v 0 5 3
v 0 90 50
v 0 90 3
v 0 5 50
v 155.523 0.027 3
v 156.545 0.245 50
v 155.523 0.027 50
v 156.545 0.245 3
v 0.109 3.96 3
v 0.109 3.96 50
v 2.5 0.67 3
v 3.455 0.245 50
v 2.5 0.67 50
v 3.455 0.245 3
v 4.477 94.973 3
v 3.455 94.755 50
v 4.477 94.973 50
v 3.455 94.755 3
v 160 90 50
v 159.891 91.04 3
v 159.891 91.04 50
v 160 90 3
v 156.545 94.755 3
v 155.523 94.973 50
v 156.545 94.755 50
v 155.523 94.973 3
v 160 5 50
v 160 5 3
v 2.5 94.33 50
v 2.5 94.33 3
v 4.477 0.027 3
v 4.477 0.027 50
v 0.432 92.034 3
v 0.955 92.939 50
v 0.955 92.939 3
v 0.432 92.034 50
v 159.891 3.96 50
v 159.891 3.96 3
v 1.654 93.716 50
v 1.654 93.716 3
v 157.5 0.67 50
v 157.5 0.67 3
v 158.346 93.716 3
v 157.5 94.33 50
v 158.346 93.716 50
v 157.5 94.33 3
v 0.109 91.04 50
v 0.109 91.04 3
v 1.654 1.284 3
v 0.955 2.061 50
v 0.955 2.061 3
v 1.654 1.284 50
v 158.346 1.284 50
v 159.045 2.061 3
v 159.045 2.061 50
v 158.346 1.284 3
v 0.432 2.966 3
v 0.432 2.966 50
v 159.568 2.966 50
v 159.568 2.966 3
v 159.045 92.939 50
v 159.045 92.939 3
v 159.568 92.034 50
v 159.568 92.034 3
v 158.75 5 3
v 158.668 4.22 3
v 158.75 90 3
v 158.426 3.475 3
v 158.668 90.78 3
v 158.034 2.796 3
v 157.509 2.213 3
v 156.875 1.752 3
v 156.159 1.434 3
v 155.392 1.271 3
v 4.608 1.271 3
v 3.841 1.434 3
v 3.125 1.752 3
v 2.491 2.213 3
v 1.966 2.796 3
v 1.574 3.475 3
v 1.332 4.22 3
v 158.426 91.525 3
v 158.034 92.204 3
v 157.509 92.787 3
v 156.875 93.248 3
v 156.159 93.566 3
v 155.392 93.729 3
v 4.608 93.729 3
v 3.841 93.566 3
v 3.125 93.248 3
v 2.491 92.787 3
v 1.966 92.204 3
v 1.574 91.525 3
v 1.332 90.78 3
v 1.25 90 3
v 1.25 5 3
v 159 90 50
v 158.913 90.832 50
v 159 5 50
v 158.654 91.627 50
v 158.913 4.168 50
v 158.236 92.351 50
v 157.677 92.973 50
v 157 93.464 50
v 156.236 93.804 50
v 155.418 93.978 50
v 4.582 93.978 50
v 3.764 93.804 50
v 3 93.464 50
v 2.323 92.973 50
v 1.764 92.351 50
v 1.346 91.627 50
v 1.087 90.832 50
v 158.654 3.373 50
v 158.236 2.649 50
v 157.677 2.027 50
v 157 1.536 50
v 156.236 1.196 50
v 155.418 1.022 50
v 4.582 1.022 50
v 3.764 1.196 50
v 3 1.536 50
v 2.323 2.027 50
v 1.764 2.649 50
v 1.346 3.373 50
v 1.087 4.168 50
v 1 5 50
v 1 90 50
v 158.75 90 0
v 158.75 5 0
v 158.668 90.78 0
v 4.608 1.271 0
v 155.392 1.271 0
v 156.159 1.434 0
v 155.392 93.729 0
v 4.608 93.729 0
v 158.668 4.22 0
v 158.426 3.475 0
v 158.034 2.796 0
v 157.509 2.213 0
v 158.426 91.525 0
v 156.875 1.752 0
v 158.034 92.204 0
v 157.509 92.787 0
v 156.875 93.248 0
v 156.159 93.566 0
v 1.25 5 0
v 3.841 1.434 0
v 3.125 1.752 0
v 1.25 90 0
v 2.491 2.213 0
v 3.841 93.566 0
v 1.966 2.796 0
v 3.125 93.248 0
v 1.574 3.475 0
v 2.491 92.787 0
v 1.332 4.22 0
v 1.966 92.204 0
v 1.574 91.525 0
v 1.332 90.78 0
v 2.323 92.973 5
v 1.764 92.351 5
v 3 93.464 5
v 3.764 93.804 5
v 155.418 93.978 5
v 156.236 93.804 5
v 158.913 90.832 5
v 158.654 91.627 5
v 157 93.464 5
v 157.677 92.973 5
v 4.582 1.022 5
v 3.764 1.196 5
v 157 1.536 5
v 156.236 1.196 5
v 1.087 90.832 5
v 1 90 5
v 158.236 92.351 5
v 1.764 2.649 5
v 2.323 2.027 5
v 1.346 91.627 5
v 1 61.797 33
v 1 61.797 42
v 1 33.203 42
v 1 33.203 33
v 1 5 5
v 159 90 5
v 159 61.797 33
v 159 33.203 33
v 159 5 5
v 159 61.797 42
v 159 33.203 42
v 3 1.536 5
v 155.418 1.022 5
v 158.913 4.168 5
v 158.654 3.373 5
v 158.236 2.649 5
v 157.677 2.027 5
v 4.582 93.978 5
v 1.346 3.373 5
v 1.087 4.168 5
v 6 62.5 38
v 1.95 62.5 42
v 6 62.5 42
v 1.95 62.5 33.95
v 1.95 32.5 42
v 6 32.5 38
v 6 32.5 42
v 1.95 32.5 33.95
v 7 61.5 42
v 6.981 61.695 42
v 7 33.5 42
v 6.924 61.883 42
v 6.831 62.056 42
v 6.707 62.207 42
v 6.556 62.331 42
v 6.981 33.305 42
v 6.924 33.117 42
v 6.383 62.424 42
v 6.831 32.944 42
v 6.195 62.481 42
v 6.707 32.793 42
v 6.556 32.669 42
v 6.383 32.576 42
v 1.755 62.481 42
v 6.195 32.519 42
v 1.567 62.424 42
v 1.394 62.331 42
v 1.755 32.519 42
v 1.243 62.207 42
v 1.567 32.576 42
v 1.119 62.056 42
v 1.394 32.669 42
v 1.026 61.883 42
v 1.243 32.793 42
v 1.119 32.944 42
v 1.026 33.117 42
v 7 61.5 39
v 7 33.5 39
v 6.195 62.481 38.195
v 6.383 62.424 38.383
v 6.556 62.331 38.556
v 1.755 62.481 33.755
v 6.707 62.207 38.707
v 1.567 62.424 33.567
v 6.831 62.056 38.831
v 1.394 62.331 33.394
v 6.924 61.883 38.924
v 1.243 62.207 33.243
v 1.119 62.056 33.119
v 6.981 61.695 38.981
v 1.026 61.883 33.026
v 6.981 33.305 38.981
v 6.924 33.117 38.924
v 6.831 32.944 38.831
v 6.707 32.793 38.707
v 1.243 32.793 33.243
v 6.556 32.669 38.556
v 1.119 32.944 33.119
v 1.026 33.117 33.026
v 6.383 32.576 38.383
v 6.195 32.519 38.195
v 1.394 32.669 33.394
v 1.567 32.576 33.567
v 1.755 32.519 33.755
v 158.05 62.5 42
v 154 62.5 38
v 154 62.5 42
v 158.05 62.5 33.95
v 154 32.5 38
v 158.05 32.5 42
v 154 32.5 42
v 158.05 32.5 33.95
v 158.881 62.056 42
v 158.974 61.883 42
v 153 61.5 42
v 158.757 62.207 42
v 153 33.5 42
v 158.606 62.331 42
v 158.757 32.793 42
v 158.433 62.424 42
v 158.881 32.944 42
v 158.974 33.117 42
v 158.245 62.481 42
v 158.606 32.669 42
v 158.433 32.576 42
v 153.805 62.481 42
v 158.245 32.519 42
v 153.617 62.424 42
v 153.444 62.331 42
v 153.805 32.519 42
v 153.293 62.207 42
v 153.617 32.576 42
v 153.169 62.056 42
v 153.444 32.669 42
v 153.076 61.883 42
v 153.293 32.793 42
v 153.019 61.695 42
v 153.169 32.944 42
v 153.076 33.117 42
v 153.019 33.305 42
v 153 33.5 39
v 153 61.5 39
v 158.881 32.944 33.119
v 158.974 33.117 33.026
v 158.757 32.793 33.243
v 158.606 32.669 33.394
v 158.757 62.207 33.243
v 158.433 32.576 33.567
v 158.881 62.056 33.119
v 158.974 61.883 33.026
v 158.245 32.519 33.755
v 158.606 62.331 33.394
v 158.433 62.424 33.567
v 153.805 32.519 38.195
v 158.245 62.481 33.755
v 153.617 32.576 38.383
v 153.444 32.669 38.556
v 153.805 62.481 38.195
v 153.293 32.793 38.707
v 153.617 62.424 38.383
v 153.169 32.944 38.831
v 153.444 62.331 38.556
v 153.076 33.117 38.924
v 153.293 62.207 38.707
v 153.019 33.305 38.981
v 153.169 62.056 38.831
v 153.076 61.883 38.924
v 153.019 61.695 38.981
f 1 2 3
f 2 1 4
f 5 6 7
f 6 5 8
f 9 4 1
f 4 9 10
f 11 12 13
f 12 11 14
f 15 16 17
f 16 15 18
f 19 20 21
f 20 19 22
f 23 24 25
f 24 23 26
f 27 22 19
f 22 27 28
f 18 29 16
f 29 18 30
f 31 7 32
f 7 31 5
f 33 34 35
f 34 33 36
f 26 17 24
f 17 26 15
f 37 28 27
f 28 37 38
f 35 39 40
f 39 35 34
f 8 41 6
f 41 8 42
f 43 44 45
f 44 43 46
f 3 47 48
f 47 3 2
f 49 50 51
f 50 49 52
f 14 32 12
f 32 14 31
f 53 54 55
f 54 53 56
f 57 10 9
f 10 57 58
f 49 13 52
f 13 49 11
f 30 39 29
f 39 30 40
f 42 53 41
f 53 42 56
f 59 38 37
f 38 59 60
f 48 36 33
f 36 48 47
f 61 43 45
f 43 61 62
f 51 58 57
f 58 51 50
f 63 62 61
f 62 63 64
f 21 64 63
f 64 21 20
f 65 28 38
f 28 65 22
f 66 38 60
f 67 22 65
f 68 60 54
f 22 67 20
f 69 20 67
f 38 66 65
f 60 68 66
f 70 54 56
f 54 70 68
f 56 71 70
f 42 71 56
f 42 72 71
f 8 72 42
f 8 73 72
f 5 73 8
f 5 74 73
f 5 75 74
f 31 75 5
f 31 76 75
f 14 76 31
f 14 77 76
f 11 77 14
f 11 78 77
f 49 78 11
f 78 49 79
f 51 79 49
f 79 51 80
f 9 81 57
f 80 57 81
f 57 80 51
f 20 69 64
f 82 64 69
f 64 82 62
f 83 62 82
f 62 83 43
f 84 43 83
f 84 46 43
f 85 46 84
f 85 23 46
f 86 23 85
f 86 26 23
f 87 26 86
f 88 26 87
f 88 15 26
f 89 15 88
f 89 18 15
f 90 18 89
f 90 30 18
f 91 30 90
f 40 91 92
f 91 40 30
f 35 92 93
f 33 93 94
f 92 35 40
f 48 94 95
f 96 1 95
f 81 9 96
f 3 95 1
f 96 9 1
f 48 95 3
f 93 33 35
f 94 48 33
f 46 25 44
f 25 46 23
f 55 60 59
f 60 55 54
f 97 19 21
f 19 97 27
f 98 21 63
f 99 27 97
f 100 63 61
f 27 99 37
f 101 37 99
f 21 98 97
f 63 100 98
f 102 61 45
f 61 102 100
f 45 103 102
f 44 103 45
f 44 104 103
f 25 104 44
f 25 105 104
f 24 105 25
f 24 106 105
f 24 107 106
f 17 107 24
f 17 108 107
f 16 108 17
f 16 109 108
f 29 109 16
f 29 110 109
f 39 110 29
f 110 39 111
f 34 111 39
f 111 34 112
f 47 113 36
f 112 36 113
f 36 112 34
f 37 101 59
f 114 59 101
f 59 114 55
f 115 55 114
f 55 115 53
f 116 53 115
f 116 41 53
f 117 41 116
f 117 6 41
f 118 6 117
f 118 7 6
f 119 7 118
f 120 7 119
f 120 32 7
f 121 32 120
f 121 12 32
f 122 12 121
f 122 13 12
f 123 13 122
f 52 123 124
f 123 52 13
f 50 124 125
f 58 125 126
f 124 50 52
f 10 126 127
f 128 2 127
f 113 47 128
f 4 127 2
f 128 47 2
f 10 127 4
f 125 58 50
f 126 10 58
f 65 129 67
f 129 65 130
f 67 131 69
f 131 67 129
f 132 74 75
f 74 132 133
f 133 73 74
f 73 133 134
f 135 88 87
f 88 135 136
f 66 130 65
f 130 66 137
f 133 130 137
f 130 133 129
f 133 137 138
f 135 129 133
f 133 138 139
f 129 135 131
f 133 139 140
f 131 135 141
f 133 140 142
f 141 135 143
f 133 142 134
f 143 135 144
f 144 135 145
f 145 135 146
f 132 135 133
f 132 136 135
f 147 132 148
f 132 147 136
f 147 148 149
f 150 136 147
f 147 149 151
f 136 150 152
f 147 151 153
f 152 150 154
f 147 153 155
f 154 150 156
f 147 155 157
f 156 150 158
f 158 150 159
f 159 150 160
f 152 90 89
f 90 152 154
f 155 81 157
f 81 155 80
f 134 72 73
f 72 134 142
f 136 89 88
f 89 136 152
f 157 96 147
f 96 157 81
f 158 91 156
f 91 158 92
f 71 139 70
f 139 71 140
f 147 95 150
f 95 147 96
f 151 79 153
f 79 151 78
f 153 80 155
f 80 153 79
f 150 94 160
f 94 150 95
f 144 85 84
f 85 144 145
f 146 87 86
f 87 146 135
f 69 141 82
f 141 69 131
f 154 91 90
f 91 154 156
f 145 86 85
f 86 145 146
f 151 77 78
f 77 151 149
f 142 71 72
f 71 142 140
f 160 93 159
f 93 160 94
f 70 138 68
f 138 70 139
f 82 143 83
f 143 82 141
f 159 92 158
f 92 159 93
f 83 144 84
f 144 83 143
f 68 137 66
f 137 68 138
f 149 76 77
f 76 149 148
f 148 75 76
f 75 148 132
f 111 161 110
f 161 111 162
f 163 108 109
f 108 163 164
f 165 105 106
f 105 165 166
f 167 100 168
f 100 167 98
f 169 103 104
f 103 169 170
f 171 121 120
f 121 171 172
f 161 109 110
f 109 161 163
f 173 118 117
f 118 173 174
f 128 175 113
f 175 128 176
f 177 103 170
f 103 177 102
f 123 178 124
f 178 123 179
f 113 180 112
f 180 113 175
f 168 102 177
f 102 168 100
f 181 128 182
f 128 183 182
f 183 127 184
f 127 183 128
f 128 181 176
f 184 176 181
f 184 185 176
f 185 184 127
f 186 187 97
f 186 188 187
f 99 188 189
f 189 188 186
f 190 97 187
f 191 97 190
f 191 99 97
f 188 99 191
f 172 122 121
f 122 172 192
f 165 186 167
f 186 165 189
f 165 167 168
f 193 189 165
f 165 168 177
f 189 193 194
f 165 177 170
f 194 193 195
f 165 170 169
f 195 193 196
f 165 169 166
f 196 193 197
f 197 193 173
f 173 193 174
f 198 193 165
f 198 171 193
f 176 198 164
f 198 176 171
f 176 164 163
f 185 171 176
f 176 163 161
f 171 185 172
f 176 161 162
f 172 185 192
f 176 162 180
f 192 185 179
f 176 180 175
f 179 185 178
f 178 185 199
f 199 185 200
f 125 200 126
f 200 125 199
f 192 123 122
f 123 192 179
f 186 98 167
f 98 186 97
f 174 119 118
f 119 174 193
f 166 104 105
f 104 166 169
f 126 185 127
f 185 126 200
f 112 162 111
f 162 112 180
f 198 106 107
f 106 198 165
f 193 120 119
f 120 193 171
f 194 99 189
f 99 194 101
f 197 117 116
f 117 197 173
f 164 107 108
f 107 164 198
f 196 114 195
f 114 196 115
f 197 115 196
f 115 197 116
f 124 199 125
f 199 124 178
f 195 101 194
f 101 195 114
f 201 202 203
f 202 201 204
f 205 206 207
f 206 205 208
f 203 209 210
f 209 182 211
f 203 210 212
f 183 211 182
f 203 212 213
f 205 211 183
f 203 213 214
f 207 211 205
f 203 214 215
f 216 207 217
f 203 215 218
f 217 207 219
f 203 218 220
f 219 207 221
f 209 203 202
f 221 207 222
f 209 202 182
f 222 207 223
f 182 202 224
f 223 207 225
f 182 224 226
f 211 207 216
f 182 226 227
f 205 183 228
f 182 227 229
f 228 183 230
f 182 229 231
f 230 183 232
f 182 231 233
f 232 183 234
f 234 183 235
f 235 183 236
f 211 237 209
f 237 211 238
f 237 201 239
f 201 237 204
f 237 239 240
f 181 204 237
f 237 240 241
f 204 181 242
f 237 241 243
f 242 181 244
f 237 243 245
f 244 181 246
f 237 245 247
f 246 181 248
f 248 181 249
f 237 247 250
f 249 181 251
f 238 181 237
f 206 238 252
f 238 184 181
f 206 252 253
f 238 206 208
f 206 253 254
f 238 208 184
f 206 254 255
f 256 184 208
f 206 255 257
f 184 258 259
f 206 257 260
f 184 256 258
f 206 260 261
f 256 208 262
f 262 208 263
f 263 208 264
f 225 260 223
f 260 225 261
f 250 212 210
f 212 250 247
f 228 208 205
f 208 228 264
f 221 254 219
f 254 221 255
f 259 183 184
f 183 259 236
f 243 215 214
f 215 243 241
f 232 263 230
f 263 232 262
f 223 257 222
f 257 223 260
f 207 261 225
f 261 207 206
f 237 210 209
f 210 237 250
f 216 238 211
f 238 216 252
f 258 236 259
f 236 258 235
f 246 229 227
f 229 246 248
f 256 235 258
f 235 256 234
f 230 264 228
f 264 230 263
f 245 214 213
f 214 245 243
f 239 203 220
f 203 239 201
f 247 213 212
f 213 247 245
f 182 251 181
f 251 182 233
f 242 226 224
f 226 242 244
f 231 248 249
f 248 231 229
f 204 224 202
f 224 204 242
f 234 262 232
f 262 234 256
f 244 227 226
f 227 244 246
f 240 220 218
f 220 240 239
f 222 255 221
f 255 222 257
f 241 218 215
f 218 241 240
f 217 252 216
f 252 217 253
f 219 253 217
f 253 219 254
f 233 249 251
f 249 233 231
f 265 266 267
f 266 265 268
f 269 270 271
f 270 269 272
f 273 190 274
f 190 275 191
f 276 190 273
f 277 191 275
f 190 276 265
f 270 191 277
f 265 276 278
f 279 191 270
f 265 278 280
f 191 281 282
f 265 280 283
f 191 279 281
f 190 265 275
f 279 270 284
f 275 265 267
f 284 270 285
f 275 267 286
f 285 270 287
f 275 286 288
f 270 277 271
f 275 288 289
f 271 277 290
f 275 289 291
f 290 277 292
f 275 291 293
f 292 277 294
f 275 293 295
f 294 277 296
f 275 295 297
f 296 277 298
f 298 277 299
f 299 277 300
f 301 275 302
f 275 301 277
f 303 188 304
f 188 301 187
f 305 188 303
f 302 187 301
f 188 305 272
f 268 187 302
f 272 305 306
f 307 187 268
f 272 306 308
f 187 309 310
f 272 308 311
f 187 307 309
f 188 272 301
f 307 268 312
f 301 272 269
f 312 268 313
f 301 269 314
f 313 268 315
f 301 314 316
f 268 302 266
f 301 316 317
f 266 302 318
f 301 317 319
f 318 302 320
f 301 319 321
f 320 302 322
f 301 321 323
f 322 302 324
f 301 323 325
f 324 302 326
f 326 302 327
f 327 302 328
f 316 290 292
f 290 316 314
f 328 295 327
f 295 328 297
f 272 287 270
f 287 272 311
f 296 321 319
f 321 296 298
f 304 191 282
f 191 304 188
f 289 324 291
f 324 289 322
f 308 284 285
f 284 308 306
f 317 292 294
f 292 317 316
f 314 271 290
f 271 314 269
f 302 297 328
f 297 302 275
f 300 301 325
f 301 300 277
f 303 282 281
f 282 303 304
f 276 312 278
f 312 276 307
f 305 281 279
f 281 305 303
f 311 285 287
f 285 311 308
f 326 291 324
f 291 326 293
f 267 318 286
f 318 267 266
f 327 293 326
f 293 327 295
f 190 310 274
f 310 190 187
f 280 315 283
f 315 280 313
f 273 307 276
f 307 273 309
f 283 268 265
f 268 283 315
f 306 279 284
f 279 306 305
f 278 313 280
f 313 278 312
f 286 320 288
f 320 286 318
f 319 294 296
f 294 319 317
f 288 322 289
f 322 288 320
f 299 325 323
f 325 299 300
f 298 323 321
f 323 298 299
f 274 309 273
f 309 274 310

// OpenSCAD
/* [Display] */
itemsShown="both"; // [both,box,lid]

/* [Box] */
boxLength=160;
boxWidth=95;
boxHeight=50;
cornerRadius=5;
wallThickness=1;
bottomThickness=2;

/* [Stacking] */
// Lidless boxes only. The inset base locates inside the box below.
withStacking=true;
stackingDepth=3;
// Gap per side between the inset base and the lower box's inner wall.
stackingClearance=0.25;

/* [Lid] */
withLid=false;
lidThickness=2;
lidClearance=0.2;
lidEdgeThickness=0.5;
withNotch=true;

/* [Internal pull ledges] */
// Short end walls: start is X=0, end is X=boxLength. Remove the lid before lifting.
pullLedges="both"; // [none,start,end,both]
pullWidth=30;
pullProjection=6;
pullThickness=3;
// Distance down from the box top to the ledge top.
pullTopOffset=8;

/* [Lid artwork] */
withLidArtwork=true;
lidArtworkFile="robot-relief.svg";
lidArtworkDepth=0.5;
lidArtworkMargin=8;
// Expand each side of the linework to make fine lines printable.
lidArtworkLineGrowth=0.2;

/* [Global] */
assert(is_bool(withLid),"withLid must be true or false.");
assert(is_bool(withStacking),"withStacking must be true or false.");
assert(itemsShown=="both" || itemsShown=="box" || itemsShown=="lid",
	   "itemsShown must be both, box, or lid.");

if (itemsShown=="box" || itemsShown=="both") showBox();
if (withLid && (itemsShown=="lid" || itemsShown=="both")) showLid();
if (!withLid && itemsShown=="lid")
	echo("Lid disabled: set withLid=true, or select itemsShown=box or both.");

module showLid(){
	l=boxLength-wallThickness;
	w=boxWidth-2*wallThickness-lidClearance;
	translate ([0, -2*wallThickness, 0])
	difference(){
		roundBoxLid(l=l,
					w=w,
					h=lidThickness,
					et=lidEdgeThickness,
					r=cornerRadius-wallThickness,
					notch=withNotch);
		if (withLidArtwork) lidArtwork(l=l,w=w,h=lidThickness);
	}
}

module lidArtwork(l,w,h){
	// Aspect ratio of the cropped robot SVG after rotating it along the lid.
	artworkAspect=939/453;
	padding=lidArtworkMargin+lidArtworkLineGrowth;
	artworkLength=min(l-2*padding,(w-2*padding)*artworkAspect);
	assert(lidArtworkDepth>0 && lidArtworkDepth<h,
		   "Lid artwork depth must be positive and less than the lid thickness.");
	assert(lidArtworkMargin>=0,"Lid artwork margin cannot be negative.");
	assert(lidArtworkLineGrowth>=0,"Lid artwork line growth cannot be negative.");
	assert(l>2*padding && w>2*padding,"The lid is too small for the artwork margins.");

	// The lid occupies negative Y. Extend the engraving cutter above its top.
	translate([l/2,-w/2,h-lidArtworkDepth])
	linear_extrude(height=lidArtworkDepth+0.01,convexity=10)
	offset(delta=lidArtworkLineGrowth)
	resize([artworkLength,0],auto=true)
	rotate([0,0,90])
	import(file=lidArtworkFile,center=true);
}

module showBox(){
	round_box(l=boxLength,
			  w=boxWidth,
			  h=boxHeight,
			  bt=bottomThickness,
			  wt=wallThickness,
			  lt=lidThickness,
			  r=cornerRadius,
			  et=lidEdgeThickness,
			  lidEnabled=withLid,
			  ledges=pullLedges,
			  ledgeWidth=pullWidth,
			  ledgeProjection=pullProjection,
			  ledgeThickness=pullThickness,
			  ledgeTopOffset=pullTopOffset,
			  stackable=withStacking,
			  stackDepth=stackingDepth,
			  stackClearance=stackingClearance);
}

module round_box(l=40,w=30,h=30,bt=2,wt=2,lt=2,r=5,et=0.5,
				 lidEnabled=false,ledges="none",ledgeWidth=30,
				 ledgeProjection=6,ledgeThickness=3,ledgeTopOffset=8,
				 stackable=false,stackDepth=3,stackClearance=0.25){
	stackEnabled=stackable && !lidEnabled;
	baseHeight=stackEnabled ? stackDepth : 0;
	baseInset=wt+stackClearance;
	floorHeight=bt+baseHeight;
	assert(wt>0 && l>2*wt && w>2*wt,
		   "Box length and width must exceed twice the positive wall thickness.");
	assert(bt>0 && h>bt,"Box height must exceed the positive bottom thickness.");
	assert(r>wt && 2*r<=min(l,w),
		   "Corner radius must exceed wall thickness and fit within the box.");
	if (stackEnabled){
		assert(stackDepth>0 && floorHeight<h,
			   "Stacking depth must be positive and leave room above the raised floor.");
		assert(h-stackDepth>=floorHeight+0.5,
			   "The stacked base must remain at least 0.5 mm above the lower box floor.");
		assert(stackClearance>0,"Stacking clearance must be positive.");
		assert(l>2*baseInset && w>2*baseInset && r>baseInset,
			   "The inset stacking base must fit within the box and its corner radius.");
		if (ledges!="none")
			assert(ledgeTopOffset>=stackDepth+0.5,
				   "Pull top offset must clear the stacked base: stackingDepth + 0.5 mm.");
	}
	if (lidEnabled){
		assert(lt>0 && h>bt+lt+wt,
			   "The positive lid thickness and rails must fit above the box bottom.");
		assert(et>=0 && et<=lt,"Lid edge thickness must be between zero and lid thickness.");
	}

	union(){
		difference(){
			union(){
				translate([0,0,baseHeight])
				round_cube(l=l,w=w,h=(lidEnabled ? h-lt : h)-baseHeight,r=r);
				if (stackEnabled)
					// Overlap the solid base with the floor above the seating shoulder.
					translate([baseInset,baseInset,0])
					round_cube(l=l-2*baseInset,w=w-2*baseInset,
							   h=baseHeight+min(0.01,bt/2),r=r-baseInset);
			}
			translate ([wt, wt, floorHeight])
			round_cube(l=l-2*wt,w=w-2*wt,h=h,r=r-wt);
		}
		if (lidEnabled){
			roundBoxRim(l=l,w=w,h=h,et=et,r=r,wt=wt,lt=lt);
			translate ([0, 0, -wt])
			roundBoxRim(l=l,w=w,h=h,et=et,r=r,wt=wt,lt=lt);
		}
		internalPullLedges(l=l,w=w,h=h,bt=floorHeight,wt=wt,r=r,lt=lt,
						   lidEnabled=lidEnabled,placement=ledges,
						   width=ledgeWidth,projection=ledgeProjection,
						   thickness=ledgeThickness,topOffset=ledgeTopOffset);
	}
}

module internalPullLedges(l,w,h,bt,wt,r,lt,lidEnabled,
						 placement,width,projection,thickness,topOffset){
	assert(placement=="none" || placement=="start" ||
		   placement=="end" || placement=="both",
		   "pullLedges must be none, start, end, or both.");
	if (placement!="none"){
		clearance=0.5;
		overlap=min(0.05,wt/4);
		assert(width>0 && projection>0 && thickness>0 && topOffset>0,
			   "Pull width, projection, thickness, and top offset must be positive.");
		assert(width<=w-2*r,"Pull width must fit between the rounded end-wall corners.");
		assert((placement=="both" ? 2 : 1)*projection<l-2*wt,
			   "Pull projection leaves no space between the ledge and the opposite side.");
		assert(h-topOffset-thickness-projection-overlap>=bt+clearance,
			   "Pull ledge underside must remain at least 0.5 mm above the box bottom.");
		if (lidEnabled)
			assert(topOffset>=lt+wt+clearance,
				   "Pull top offset must clear the lid rails: lidThickness + wallThickness + 0.5 mm.");

		if (placement=="start" || placement=="both")
			translate([wt,w/2,h-topOffset])
			pullLedge(width,projection,thickness,overlap);
		if (placement=="end" || placement=="both")
			translate([l-wt,w/2,h-topOffset])
			mirror([1,0,0])
			pullLedge(width,projection,thickness,overlap);
	}
}

module pullLedge(width,projection,thickness,overlap){
	rounding=min(1,width/4,(projection+overlap)/4);
	totalHeight=thickness+projection+overlap;
	intersection(){
		// A 45-degree underside grows from the wall into the finger ledge.
		translate([0,width/2,0])
		rotate([90,0,0])
		linear_extrude(height=width,convexity=4)
		polygon(points=[[-overlap,0],[projection,0],
						[projection,-thickness],[-overlap,-totalHeight]]);
		translate([-overlap,-width/2,-totalHeight])
		round_cube(l=projection+overlap,w=width,h=totalHeight+0.01,
				   r=rounding,$fn=32);
	}
}

module roundBoxRim(l=boxLength,
				   w=boxWidth,
				   h=boxHeight,
				   et=lidEdgeThickness,
				   r=cornerRadius,
				   wt=wallThickness,
				   lt=lidThickness){
	difference() {
		translate ([0, 0, h-lt])
		round_cube(l=l,w=w,h=lt,r=r);
		translate ([wt+lt,wt+lt-et*2,h-lt-0.1])
		round_cube(l=l*2,w=w-2*(wt+lt)+4*et,h=lt+0.2,r=r-wt+lt);

		//subtract out a lid to make the ledge
		translate ([wt, w-wt, h-lt-0.1])
		roundBoxLid(l=l*2,w=w-2*wt,h=lt+0.1,wt=wt,t=lt,et=0.5,r=r-wt,notch=false);
	}
}

module roundBoxLid(l=40,w=30,h=3,wt=2,t=2,et=0.5,r=5,notch=true){
	translate ([l, 0, 0])
	rotate (a = [0, 0, 180])
	difference(){
		round_cube(l=l,w=w,h=h,r=r);

		translate ([-1, 0, et]) rotate (a = [45, 0, 0])  cube (size = [l+2, h*2, h*2]);
		translate ([-1, w, et]) rotate (a = [45, 0, 0])  cube (size = [l+2, h*2, h*2]);
		translate ([l, -1, et]) rotate (a = [45, 0, 90]) cube (size = [w+2, h*2, h*2]);
		if (notch==true){
			translate([2,w/2,h+0.001]) thumbNotch(10/2,72,t);
		}
	}
}

module thumbNotch(
	thumbR=12/2,
	angle=72,
	notchHeight=2){

	size=10*thumbR;

	rotate([0,0,90])
	difference(){
		translate([0,
					(thumbR*sin(angle)-notchHeight)/tan(angle),
					 thumbR*sin(angle)-notchHeight])
		rotate([angle,0,0])
		cylinder(r=thumbR,h=size,$fn=30);

		translate([-size,-size,0])
		cube(size*2);
	}
}

module round_cube(l=40,w=30,h=20,r=5,$fn=30){
	hull(){
		translate ([r, r, 0]) cylinder (h = h, r=r);
		translate ([r, w-r, 0]) cylinder (h = h, r=r);
		translate ([l-r,w-r, 0]) cylinder (h = h, r=r);
		translate ([l-r, r, 0]) cylinder (h = h, r=r);
	}
}
